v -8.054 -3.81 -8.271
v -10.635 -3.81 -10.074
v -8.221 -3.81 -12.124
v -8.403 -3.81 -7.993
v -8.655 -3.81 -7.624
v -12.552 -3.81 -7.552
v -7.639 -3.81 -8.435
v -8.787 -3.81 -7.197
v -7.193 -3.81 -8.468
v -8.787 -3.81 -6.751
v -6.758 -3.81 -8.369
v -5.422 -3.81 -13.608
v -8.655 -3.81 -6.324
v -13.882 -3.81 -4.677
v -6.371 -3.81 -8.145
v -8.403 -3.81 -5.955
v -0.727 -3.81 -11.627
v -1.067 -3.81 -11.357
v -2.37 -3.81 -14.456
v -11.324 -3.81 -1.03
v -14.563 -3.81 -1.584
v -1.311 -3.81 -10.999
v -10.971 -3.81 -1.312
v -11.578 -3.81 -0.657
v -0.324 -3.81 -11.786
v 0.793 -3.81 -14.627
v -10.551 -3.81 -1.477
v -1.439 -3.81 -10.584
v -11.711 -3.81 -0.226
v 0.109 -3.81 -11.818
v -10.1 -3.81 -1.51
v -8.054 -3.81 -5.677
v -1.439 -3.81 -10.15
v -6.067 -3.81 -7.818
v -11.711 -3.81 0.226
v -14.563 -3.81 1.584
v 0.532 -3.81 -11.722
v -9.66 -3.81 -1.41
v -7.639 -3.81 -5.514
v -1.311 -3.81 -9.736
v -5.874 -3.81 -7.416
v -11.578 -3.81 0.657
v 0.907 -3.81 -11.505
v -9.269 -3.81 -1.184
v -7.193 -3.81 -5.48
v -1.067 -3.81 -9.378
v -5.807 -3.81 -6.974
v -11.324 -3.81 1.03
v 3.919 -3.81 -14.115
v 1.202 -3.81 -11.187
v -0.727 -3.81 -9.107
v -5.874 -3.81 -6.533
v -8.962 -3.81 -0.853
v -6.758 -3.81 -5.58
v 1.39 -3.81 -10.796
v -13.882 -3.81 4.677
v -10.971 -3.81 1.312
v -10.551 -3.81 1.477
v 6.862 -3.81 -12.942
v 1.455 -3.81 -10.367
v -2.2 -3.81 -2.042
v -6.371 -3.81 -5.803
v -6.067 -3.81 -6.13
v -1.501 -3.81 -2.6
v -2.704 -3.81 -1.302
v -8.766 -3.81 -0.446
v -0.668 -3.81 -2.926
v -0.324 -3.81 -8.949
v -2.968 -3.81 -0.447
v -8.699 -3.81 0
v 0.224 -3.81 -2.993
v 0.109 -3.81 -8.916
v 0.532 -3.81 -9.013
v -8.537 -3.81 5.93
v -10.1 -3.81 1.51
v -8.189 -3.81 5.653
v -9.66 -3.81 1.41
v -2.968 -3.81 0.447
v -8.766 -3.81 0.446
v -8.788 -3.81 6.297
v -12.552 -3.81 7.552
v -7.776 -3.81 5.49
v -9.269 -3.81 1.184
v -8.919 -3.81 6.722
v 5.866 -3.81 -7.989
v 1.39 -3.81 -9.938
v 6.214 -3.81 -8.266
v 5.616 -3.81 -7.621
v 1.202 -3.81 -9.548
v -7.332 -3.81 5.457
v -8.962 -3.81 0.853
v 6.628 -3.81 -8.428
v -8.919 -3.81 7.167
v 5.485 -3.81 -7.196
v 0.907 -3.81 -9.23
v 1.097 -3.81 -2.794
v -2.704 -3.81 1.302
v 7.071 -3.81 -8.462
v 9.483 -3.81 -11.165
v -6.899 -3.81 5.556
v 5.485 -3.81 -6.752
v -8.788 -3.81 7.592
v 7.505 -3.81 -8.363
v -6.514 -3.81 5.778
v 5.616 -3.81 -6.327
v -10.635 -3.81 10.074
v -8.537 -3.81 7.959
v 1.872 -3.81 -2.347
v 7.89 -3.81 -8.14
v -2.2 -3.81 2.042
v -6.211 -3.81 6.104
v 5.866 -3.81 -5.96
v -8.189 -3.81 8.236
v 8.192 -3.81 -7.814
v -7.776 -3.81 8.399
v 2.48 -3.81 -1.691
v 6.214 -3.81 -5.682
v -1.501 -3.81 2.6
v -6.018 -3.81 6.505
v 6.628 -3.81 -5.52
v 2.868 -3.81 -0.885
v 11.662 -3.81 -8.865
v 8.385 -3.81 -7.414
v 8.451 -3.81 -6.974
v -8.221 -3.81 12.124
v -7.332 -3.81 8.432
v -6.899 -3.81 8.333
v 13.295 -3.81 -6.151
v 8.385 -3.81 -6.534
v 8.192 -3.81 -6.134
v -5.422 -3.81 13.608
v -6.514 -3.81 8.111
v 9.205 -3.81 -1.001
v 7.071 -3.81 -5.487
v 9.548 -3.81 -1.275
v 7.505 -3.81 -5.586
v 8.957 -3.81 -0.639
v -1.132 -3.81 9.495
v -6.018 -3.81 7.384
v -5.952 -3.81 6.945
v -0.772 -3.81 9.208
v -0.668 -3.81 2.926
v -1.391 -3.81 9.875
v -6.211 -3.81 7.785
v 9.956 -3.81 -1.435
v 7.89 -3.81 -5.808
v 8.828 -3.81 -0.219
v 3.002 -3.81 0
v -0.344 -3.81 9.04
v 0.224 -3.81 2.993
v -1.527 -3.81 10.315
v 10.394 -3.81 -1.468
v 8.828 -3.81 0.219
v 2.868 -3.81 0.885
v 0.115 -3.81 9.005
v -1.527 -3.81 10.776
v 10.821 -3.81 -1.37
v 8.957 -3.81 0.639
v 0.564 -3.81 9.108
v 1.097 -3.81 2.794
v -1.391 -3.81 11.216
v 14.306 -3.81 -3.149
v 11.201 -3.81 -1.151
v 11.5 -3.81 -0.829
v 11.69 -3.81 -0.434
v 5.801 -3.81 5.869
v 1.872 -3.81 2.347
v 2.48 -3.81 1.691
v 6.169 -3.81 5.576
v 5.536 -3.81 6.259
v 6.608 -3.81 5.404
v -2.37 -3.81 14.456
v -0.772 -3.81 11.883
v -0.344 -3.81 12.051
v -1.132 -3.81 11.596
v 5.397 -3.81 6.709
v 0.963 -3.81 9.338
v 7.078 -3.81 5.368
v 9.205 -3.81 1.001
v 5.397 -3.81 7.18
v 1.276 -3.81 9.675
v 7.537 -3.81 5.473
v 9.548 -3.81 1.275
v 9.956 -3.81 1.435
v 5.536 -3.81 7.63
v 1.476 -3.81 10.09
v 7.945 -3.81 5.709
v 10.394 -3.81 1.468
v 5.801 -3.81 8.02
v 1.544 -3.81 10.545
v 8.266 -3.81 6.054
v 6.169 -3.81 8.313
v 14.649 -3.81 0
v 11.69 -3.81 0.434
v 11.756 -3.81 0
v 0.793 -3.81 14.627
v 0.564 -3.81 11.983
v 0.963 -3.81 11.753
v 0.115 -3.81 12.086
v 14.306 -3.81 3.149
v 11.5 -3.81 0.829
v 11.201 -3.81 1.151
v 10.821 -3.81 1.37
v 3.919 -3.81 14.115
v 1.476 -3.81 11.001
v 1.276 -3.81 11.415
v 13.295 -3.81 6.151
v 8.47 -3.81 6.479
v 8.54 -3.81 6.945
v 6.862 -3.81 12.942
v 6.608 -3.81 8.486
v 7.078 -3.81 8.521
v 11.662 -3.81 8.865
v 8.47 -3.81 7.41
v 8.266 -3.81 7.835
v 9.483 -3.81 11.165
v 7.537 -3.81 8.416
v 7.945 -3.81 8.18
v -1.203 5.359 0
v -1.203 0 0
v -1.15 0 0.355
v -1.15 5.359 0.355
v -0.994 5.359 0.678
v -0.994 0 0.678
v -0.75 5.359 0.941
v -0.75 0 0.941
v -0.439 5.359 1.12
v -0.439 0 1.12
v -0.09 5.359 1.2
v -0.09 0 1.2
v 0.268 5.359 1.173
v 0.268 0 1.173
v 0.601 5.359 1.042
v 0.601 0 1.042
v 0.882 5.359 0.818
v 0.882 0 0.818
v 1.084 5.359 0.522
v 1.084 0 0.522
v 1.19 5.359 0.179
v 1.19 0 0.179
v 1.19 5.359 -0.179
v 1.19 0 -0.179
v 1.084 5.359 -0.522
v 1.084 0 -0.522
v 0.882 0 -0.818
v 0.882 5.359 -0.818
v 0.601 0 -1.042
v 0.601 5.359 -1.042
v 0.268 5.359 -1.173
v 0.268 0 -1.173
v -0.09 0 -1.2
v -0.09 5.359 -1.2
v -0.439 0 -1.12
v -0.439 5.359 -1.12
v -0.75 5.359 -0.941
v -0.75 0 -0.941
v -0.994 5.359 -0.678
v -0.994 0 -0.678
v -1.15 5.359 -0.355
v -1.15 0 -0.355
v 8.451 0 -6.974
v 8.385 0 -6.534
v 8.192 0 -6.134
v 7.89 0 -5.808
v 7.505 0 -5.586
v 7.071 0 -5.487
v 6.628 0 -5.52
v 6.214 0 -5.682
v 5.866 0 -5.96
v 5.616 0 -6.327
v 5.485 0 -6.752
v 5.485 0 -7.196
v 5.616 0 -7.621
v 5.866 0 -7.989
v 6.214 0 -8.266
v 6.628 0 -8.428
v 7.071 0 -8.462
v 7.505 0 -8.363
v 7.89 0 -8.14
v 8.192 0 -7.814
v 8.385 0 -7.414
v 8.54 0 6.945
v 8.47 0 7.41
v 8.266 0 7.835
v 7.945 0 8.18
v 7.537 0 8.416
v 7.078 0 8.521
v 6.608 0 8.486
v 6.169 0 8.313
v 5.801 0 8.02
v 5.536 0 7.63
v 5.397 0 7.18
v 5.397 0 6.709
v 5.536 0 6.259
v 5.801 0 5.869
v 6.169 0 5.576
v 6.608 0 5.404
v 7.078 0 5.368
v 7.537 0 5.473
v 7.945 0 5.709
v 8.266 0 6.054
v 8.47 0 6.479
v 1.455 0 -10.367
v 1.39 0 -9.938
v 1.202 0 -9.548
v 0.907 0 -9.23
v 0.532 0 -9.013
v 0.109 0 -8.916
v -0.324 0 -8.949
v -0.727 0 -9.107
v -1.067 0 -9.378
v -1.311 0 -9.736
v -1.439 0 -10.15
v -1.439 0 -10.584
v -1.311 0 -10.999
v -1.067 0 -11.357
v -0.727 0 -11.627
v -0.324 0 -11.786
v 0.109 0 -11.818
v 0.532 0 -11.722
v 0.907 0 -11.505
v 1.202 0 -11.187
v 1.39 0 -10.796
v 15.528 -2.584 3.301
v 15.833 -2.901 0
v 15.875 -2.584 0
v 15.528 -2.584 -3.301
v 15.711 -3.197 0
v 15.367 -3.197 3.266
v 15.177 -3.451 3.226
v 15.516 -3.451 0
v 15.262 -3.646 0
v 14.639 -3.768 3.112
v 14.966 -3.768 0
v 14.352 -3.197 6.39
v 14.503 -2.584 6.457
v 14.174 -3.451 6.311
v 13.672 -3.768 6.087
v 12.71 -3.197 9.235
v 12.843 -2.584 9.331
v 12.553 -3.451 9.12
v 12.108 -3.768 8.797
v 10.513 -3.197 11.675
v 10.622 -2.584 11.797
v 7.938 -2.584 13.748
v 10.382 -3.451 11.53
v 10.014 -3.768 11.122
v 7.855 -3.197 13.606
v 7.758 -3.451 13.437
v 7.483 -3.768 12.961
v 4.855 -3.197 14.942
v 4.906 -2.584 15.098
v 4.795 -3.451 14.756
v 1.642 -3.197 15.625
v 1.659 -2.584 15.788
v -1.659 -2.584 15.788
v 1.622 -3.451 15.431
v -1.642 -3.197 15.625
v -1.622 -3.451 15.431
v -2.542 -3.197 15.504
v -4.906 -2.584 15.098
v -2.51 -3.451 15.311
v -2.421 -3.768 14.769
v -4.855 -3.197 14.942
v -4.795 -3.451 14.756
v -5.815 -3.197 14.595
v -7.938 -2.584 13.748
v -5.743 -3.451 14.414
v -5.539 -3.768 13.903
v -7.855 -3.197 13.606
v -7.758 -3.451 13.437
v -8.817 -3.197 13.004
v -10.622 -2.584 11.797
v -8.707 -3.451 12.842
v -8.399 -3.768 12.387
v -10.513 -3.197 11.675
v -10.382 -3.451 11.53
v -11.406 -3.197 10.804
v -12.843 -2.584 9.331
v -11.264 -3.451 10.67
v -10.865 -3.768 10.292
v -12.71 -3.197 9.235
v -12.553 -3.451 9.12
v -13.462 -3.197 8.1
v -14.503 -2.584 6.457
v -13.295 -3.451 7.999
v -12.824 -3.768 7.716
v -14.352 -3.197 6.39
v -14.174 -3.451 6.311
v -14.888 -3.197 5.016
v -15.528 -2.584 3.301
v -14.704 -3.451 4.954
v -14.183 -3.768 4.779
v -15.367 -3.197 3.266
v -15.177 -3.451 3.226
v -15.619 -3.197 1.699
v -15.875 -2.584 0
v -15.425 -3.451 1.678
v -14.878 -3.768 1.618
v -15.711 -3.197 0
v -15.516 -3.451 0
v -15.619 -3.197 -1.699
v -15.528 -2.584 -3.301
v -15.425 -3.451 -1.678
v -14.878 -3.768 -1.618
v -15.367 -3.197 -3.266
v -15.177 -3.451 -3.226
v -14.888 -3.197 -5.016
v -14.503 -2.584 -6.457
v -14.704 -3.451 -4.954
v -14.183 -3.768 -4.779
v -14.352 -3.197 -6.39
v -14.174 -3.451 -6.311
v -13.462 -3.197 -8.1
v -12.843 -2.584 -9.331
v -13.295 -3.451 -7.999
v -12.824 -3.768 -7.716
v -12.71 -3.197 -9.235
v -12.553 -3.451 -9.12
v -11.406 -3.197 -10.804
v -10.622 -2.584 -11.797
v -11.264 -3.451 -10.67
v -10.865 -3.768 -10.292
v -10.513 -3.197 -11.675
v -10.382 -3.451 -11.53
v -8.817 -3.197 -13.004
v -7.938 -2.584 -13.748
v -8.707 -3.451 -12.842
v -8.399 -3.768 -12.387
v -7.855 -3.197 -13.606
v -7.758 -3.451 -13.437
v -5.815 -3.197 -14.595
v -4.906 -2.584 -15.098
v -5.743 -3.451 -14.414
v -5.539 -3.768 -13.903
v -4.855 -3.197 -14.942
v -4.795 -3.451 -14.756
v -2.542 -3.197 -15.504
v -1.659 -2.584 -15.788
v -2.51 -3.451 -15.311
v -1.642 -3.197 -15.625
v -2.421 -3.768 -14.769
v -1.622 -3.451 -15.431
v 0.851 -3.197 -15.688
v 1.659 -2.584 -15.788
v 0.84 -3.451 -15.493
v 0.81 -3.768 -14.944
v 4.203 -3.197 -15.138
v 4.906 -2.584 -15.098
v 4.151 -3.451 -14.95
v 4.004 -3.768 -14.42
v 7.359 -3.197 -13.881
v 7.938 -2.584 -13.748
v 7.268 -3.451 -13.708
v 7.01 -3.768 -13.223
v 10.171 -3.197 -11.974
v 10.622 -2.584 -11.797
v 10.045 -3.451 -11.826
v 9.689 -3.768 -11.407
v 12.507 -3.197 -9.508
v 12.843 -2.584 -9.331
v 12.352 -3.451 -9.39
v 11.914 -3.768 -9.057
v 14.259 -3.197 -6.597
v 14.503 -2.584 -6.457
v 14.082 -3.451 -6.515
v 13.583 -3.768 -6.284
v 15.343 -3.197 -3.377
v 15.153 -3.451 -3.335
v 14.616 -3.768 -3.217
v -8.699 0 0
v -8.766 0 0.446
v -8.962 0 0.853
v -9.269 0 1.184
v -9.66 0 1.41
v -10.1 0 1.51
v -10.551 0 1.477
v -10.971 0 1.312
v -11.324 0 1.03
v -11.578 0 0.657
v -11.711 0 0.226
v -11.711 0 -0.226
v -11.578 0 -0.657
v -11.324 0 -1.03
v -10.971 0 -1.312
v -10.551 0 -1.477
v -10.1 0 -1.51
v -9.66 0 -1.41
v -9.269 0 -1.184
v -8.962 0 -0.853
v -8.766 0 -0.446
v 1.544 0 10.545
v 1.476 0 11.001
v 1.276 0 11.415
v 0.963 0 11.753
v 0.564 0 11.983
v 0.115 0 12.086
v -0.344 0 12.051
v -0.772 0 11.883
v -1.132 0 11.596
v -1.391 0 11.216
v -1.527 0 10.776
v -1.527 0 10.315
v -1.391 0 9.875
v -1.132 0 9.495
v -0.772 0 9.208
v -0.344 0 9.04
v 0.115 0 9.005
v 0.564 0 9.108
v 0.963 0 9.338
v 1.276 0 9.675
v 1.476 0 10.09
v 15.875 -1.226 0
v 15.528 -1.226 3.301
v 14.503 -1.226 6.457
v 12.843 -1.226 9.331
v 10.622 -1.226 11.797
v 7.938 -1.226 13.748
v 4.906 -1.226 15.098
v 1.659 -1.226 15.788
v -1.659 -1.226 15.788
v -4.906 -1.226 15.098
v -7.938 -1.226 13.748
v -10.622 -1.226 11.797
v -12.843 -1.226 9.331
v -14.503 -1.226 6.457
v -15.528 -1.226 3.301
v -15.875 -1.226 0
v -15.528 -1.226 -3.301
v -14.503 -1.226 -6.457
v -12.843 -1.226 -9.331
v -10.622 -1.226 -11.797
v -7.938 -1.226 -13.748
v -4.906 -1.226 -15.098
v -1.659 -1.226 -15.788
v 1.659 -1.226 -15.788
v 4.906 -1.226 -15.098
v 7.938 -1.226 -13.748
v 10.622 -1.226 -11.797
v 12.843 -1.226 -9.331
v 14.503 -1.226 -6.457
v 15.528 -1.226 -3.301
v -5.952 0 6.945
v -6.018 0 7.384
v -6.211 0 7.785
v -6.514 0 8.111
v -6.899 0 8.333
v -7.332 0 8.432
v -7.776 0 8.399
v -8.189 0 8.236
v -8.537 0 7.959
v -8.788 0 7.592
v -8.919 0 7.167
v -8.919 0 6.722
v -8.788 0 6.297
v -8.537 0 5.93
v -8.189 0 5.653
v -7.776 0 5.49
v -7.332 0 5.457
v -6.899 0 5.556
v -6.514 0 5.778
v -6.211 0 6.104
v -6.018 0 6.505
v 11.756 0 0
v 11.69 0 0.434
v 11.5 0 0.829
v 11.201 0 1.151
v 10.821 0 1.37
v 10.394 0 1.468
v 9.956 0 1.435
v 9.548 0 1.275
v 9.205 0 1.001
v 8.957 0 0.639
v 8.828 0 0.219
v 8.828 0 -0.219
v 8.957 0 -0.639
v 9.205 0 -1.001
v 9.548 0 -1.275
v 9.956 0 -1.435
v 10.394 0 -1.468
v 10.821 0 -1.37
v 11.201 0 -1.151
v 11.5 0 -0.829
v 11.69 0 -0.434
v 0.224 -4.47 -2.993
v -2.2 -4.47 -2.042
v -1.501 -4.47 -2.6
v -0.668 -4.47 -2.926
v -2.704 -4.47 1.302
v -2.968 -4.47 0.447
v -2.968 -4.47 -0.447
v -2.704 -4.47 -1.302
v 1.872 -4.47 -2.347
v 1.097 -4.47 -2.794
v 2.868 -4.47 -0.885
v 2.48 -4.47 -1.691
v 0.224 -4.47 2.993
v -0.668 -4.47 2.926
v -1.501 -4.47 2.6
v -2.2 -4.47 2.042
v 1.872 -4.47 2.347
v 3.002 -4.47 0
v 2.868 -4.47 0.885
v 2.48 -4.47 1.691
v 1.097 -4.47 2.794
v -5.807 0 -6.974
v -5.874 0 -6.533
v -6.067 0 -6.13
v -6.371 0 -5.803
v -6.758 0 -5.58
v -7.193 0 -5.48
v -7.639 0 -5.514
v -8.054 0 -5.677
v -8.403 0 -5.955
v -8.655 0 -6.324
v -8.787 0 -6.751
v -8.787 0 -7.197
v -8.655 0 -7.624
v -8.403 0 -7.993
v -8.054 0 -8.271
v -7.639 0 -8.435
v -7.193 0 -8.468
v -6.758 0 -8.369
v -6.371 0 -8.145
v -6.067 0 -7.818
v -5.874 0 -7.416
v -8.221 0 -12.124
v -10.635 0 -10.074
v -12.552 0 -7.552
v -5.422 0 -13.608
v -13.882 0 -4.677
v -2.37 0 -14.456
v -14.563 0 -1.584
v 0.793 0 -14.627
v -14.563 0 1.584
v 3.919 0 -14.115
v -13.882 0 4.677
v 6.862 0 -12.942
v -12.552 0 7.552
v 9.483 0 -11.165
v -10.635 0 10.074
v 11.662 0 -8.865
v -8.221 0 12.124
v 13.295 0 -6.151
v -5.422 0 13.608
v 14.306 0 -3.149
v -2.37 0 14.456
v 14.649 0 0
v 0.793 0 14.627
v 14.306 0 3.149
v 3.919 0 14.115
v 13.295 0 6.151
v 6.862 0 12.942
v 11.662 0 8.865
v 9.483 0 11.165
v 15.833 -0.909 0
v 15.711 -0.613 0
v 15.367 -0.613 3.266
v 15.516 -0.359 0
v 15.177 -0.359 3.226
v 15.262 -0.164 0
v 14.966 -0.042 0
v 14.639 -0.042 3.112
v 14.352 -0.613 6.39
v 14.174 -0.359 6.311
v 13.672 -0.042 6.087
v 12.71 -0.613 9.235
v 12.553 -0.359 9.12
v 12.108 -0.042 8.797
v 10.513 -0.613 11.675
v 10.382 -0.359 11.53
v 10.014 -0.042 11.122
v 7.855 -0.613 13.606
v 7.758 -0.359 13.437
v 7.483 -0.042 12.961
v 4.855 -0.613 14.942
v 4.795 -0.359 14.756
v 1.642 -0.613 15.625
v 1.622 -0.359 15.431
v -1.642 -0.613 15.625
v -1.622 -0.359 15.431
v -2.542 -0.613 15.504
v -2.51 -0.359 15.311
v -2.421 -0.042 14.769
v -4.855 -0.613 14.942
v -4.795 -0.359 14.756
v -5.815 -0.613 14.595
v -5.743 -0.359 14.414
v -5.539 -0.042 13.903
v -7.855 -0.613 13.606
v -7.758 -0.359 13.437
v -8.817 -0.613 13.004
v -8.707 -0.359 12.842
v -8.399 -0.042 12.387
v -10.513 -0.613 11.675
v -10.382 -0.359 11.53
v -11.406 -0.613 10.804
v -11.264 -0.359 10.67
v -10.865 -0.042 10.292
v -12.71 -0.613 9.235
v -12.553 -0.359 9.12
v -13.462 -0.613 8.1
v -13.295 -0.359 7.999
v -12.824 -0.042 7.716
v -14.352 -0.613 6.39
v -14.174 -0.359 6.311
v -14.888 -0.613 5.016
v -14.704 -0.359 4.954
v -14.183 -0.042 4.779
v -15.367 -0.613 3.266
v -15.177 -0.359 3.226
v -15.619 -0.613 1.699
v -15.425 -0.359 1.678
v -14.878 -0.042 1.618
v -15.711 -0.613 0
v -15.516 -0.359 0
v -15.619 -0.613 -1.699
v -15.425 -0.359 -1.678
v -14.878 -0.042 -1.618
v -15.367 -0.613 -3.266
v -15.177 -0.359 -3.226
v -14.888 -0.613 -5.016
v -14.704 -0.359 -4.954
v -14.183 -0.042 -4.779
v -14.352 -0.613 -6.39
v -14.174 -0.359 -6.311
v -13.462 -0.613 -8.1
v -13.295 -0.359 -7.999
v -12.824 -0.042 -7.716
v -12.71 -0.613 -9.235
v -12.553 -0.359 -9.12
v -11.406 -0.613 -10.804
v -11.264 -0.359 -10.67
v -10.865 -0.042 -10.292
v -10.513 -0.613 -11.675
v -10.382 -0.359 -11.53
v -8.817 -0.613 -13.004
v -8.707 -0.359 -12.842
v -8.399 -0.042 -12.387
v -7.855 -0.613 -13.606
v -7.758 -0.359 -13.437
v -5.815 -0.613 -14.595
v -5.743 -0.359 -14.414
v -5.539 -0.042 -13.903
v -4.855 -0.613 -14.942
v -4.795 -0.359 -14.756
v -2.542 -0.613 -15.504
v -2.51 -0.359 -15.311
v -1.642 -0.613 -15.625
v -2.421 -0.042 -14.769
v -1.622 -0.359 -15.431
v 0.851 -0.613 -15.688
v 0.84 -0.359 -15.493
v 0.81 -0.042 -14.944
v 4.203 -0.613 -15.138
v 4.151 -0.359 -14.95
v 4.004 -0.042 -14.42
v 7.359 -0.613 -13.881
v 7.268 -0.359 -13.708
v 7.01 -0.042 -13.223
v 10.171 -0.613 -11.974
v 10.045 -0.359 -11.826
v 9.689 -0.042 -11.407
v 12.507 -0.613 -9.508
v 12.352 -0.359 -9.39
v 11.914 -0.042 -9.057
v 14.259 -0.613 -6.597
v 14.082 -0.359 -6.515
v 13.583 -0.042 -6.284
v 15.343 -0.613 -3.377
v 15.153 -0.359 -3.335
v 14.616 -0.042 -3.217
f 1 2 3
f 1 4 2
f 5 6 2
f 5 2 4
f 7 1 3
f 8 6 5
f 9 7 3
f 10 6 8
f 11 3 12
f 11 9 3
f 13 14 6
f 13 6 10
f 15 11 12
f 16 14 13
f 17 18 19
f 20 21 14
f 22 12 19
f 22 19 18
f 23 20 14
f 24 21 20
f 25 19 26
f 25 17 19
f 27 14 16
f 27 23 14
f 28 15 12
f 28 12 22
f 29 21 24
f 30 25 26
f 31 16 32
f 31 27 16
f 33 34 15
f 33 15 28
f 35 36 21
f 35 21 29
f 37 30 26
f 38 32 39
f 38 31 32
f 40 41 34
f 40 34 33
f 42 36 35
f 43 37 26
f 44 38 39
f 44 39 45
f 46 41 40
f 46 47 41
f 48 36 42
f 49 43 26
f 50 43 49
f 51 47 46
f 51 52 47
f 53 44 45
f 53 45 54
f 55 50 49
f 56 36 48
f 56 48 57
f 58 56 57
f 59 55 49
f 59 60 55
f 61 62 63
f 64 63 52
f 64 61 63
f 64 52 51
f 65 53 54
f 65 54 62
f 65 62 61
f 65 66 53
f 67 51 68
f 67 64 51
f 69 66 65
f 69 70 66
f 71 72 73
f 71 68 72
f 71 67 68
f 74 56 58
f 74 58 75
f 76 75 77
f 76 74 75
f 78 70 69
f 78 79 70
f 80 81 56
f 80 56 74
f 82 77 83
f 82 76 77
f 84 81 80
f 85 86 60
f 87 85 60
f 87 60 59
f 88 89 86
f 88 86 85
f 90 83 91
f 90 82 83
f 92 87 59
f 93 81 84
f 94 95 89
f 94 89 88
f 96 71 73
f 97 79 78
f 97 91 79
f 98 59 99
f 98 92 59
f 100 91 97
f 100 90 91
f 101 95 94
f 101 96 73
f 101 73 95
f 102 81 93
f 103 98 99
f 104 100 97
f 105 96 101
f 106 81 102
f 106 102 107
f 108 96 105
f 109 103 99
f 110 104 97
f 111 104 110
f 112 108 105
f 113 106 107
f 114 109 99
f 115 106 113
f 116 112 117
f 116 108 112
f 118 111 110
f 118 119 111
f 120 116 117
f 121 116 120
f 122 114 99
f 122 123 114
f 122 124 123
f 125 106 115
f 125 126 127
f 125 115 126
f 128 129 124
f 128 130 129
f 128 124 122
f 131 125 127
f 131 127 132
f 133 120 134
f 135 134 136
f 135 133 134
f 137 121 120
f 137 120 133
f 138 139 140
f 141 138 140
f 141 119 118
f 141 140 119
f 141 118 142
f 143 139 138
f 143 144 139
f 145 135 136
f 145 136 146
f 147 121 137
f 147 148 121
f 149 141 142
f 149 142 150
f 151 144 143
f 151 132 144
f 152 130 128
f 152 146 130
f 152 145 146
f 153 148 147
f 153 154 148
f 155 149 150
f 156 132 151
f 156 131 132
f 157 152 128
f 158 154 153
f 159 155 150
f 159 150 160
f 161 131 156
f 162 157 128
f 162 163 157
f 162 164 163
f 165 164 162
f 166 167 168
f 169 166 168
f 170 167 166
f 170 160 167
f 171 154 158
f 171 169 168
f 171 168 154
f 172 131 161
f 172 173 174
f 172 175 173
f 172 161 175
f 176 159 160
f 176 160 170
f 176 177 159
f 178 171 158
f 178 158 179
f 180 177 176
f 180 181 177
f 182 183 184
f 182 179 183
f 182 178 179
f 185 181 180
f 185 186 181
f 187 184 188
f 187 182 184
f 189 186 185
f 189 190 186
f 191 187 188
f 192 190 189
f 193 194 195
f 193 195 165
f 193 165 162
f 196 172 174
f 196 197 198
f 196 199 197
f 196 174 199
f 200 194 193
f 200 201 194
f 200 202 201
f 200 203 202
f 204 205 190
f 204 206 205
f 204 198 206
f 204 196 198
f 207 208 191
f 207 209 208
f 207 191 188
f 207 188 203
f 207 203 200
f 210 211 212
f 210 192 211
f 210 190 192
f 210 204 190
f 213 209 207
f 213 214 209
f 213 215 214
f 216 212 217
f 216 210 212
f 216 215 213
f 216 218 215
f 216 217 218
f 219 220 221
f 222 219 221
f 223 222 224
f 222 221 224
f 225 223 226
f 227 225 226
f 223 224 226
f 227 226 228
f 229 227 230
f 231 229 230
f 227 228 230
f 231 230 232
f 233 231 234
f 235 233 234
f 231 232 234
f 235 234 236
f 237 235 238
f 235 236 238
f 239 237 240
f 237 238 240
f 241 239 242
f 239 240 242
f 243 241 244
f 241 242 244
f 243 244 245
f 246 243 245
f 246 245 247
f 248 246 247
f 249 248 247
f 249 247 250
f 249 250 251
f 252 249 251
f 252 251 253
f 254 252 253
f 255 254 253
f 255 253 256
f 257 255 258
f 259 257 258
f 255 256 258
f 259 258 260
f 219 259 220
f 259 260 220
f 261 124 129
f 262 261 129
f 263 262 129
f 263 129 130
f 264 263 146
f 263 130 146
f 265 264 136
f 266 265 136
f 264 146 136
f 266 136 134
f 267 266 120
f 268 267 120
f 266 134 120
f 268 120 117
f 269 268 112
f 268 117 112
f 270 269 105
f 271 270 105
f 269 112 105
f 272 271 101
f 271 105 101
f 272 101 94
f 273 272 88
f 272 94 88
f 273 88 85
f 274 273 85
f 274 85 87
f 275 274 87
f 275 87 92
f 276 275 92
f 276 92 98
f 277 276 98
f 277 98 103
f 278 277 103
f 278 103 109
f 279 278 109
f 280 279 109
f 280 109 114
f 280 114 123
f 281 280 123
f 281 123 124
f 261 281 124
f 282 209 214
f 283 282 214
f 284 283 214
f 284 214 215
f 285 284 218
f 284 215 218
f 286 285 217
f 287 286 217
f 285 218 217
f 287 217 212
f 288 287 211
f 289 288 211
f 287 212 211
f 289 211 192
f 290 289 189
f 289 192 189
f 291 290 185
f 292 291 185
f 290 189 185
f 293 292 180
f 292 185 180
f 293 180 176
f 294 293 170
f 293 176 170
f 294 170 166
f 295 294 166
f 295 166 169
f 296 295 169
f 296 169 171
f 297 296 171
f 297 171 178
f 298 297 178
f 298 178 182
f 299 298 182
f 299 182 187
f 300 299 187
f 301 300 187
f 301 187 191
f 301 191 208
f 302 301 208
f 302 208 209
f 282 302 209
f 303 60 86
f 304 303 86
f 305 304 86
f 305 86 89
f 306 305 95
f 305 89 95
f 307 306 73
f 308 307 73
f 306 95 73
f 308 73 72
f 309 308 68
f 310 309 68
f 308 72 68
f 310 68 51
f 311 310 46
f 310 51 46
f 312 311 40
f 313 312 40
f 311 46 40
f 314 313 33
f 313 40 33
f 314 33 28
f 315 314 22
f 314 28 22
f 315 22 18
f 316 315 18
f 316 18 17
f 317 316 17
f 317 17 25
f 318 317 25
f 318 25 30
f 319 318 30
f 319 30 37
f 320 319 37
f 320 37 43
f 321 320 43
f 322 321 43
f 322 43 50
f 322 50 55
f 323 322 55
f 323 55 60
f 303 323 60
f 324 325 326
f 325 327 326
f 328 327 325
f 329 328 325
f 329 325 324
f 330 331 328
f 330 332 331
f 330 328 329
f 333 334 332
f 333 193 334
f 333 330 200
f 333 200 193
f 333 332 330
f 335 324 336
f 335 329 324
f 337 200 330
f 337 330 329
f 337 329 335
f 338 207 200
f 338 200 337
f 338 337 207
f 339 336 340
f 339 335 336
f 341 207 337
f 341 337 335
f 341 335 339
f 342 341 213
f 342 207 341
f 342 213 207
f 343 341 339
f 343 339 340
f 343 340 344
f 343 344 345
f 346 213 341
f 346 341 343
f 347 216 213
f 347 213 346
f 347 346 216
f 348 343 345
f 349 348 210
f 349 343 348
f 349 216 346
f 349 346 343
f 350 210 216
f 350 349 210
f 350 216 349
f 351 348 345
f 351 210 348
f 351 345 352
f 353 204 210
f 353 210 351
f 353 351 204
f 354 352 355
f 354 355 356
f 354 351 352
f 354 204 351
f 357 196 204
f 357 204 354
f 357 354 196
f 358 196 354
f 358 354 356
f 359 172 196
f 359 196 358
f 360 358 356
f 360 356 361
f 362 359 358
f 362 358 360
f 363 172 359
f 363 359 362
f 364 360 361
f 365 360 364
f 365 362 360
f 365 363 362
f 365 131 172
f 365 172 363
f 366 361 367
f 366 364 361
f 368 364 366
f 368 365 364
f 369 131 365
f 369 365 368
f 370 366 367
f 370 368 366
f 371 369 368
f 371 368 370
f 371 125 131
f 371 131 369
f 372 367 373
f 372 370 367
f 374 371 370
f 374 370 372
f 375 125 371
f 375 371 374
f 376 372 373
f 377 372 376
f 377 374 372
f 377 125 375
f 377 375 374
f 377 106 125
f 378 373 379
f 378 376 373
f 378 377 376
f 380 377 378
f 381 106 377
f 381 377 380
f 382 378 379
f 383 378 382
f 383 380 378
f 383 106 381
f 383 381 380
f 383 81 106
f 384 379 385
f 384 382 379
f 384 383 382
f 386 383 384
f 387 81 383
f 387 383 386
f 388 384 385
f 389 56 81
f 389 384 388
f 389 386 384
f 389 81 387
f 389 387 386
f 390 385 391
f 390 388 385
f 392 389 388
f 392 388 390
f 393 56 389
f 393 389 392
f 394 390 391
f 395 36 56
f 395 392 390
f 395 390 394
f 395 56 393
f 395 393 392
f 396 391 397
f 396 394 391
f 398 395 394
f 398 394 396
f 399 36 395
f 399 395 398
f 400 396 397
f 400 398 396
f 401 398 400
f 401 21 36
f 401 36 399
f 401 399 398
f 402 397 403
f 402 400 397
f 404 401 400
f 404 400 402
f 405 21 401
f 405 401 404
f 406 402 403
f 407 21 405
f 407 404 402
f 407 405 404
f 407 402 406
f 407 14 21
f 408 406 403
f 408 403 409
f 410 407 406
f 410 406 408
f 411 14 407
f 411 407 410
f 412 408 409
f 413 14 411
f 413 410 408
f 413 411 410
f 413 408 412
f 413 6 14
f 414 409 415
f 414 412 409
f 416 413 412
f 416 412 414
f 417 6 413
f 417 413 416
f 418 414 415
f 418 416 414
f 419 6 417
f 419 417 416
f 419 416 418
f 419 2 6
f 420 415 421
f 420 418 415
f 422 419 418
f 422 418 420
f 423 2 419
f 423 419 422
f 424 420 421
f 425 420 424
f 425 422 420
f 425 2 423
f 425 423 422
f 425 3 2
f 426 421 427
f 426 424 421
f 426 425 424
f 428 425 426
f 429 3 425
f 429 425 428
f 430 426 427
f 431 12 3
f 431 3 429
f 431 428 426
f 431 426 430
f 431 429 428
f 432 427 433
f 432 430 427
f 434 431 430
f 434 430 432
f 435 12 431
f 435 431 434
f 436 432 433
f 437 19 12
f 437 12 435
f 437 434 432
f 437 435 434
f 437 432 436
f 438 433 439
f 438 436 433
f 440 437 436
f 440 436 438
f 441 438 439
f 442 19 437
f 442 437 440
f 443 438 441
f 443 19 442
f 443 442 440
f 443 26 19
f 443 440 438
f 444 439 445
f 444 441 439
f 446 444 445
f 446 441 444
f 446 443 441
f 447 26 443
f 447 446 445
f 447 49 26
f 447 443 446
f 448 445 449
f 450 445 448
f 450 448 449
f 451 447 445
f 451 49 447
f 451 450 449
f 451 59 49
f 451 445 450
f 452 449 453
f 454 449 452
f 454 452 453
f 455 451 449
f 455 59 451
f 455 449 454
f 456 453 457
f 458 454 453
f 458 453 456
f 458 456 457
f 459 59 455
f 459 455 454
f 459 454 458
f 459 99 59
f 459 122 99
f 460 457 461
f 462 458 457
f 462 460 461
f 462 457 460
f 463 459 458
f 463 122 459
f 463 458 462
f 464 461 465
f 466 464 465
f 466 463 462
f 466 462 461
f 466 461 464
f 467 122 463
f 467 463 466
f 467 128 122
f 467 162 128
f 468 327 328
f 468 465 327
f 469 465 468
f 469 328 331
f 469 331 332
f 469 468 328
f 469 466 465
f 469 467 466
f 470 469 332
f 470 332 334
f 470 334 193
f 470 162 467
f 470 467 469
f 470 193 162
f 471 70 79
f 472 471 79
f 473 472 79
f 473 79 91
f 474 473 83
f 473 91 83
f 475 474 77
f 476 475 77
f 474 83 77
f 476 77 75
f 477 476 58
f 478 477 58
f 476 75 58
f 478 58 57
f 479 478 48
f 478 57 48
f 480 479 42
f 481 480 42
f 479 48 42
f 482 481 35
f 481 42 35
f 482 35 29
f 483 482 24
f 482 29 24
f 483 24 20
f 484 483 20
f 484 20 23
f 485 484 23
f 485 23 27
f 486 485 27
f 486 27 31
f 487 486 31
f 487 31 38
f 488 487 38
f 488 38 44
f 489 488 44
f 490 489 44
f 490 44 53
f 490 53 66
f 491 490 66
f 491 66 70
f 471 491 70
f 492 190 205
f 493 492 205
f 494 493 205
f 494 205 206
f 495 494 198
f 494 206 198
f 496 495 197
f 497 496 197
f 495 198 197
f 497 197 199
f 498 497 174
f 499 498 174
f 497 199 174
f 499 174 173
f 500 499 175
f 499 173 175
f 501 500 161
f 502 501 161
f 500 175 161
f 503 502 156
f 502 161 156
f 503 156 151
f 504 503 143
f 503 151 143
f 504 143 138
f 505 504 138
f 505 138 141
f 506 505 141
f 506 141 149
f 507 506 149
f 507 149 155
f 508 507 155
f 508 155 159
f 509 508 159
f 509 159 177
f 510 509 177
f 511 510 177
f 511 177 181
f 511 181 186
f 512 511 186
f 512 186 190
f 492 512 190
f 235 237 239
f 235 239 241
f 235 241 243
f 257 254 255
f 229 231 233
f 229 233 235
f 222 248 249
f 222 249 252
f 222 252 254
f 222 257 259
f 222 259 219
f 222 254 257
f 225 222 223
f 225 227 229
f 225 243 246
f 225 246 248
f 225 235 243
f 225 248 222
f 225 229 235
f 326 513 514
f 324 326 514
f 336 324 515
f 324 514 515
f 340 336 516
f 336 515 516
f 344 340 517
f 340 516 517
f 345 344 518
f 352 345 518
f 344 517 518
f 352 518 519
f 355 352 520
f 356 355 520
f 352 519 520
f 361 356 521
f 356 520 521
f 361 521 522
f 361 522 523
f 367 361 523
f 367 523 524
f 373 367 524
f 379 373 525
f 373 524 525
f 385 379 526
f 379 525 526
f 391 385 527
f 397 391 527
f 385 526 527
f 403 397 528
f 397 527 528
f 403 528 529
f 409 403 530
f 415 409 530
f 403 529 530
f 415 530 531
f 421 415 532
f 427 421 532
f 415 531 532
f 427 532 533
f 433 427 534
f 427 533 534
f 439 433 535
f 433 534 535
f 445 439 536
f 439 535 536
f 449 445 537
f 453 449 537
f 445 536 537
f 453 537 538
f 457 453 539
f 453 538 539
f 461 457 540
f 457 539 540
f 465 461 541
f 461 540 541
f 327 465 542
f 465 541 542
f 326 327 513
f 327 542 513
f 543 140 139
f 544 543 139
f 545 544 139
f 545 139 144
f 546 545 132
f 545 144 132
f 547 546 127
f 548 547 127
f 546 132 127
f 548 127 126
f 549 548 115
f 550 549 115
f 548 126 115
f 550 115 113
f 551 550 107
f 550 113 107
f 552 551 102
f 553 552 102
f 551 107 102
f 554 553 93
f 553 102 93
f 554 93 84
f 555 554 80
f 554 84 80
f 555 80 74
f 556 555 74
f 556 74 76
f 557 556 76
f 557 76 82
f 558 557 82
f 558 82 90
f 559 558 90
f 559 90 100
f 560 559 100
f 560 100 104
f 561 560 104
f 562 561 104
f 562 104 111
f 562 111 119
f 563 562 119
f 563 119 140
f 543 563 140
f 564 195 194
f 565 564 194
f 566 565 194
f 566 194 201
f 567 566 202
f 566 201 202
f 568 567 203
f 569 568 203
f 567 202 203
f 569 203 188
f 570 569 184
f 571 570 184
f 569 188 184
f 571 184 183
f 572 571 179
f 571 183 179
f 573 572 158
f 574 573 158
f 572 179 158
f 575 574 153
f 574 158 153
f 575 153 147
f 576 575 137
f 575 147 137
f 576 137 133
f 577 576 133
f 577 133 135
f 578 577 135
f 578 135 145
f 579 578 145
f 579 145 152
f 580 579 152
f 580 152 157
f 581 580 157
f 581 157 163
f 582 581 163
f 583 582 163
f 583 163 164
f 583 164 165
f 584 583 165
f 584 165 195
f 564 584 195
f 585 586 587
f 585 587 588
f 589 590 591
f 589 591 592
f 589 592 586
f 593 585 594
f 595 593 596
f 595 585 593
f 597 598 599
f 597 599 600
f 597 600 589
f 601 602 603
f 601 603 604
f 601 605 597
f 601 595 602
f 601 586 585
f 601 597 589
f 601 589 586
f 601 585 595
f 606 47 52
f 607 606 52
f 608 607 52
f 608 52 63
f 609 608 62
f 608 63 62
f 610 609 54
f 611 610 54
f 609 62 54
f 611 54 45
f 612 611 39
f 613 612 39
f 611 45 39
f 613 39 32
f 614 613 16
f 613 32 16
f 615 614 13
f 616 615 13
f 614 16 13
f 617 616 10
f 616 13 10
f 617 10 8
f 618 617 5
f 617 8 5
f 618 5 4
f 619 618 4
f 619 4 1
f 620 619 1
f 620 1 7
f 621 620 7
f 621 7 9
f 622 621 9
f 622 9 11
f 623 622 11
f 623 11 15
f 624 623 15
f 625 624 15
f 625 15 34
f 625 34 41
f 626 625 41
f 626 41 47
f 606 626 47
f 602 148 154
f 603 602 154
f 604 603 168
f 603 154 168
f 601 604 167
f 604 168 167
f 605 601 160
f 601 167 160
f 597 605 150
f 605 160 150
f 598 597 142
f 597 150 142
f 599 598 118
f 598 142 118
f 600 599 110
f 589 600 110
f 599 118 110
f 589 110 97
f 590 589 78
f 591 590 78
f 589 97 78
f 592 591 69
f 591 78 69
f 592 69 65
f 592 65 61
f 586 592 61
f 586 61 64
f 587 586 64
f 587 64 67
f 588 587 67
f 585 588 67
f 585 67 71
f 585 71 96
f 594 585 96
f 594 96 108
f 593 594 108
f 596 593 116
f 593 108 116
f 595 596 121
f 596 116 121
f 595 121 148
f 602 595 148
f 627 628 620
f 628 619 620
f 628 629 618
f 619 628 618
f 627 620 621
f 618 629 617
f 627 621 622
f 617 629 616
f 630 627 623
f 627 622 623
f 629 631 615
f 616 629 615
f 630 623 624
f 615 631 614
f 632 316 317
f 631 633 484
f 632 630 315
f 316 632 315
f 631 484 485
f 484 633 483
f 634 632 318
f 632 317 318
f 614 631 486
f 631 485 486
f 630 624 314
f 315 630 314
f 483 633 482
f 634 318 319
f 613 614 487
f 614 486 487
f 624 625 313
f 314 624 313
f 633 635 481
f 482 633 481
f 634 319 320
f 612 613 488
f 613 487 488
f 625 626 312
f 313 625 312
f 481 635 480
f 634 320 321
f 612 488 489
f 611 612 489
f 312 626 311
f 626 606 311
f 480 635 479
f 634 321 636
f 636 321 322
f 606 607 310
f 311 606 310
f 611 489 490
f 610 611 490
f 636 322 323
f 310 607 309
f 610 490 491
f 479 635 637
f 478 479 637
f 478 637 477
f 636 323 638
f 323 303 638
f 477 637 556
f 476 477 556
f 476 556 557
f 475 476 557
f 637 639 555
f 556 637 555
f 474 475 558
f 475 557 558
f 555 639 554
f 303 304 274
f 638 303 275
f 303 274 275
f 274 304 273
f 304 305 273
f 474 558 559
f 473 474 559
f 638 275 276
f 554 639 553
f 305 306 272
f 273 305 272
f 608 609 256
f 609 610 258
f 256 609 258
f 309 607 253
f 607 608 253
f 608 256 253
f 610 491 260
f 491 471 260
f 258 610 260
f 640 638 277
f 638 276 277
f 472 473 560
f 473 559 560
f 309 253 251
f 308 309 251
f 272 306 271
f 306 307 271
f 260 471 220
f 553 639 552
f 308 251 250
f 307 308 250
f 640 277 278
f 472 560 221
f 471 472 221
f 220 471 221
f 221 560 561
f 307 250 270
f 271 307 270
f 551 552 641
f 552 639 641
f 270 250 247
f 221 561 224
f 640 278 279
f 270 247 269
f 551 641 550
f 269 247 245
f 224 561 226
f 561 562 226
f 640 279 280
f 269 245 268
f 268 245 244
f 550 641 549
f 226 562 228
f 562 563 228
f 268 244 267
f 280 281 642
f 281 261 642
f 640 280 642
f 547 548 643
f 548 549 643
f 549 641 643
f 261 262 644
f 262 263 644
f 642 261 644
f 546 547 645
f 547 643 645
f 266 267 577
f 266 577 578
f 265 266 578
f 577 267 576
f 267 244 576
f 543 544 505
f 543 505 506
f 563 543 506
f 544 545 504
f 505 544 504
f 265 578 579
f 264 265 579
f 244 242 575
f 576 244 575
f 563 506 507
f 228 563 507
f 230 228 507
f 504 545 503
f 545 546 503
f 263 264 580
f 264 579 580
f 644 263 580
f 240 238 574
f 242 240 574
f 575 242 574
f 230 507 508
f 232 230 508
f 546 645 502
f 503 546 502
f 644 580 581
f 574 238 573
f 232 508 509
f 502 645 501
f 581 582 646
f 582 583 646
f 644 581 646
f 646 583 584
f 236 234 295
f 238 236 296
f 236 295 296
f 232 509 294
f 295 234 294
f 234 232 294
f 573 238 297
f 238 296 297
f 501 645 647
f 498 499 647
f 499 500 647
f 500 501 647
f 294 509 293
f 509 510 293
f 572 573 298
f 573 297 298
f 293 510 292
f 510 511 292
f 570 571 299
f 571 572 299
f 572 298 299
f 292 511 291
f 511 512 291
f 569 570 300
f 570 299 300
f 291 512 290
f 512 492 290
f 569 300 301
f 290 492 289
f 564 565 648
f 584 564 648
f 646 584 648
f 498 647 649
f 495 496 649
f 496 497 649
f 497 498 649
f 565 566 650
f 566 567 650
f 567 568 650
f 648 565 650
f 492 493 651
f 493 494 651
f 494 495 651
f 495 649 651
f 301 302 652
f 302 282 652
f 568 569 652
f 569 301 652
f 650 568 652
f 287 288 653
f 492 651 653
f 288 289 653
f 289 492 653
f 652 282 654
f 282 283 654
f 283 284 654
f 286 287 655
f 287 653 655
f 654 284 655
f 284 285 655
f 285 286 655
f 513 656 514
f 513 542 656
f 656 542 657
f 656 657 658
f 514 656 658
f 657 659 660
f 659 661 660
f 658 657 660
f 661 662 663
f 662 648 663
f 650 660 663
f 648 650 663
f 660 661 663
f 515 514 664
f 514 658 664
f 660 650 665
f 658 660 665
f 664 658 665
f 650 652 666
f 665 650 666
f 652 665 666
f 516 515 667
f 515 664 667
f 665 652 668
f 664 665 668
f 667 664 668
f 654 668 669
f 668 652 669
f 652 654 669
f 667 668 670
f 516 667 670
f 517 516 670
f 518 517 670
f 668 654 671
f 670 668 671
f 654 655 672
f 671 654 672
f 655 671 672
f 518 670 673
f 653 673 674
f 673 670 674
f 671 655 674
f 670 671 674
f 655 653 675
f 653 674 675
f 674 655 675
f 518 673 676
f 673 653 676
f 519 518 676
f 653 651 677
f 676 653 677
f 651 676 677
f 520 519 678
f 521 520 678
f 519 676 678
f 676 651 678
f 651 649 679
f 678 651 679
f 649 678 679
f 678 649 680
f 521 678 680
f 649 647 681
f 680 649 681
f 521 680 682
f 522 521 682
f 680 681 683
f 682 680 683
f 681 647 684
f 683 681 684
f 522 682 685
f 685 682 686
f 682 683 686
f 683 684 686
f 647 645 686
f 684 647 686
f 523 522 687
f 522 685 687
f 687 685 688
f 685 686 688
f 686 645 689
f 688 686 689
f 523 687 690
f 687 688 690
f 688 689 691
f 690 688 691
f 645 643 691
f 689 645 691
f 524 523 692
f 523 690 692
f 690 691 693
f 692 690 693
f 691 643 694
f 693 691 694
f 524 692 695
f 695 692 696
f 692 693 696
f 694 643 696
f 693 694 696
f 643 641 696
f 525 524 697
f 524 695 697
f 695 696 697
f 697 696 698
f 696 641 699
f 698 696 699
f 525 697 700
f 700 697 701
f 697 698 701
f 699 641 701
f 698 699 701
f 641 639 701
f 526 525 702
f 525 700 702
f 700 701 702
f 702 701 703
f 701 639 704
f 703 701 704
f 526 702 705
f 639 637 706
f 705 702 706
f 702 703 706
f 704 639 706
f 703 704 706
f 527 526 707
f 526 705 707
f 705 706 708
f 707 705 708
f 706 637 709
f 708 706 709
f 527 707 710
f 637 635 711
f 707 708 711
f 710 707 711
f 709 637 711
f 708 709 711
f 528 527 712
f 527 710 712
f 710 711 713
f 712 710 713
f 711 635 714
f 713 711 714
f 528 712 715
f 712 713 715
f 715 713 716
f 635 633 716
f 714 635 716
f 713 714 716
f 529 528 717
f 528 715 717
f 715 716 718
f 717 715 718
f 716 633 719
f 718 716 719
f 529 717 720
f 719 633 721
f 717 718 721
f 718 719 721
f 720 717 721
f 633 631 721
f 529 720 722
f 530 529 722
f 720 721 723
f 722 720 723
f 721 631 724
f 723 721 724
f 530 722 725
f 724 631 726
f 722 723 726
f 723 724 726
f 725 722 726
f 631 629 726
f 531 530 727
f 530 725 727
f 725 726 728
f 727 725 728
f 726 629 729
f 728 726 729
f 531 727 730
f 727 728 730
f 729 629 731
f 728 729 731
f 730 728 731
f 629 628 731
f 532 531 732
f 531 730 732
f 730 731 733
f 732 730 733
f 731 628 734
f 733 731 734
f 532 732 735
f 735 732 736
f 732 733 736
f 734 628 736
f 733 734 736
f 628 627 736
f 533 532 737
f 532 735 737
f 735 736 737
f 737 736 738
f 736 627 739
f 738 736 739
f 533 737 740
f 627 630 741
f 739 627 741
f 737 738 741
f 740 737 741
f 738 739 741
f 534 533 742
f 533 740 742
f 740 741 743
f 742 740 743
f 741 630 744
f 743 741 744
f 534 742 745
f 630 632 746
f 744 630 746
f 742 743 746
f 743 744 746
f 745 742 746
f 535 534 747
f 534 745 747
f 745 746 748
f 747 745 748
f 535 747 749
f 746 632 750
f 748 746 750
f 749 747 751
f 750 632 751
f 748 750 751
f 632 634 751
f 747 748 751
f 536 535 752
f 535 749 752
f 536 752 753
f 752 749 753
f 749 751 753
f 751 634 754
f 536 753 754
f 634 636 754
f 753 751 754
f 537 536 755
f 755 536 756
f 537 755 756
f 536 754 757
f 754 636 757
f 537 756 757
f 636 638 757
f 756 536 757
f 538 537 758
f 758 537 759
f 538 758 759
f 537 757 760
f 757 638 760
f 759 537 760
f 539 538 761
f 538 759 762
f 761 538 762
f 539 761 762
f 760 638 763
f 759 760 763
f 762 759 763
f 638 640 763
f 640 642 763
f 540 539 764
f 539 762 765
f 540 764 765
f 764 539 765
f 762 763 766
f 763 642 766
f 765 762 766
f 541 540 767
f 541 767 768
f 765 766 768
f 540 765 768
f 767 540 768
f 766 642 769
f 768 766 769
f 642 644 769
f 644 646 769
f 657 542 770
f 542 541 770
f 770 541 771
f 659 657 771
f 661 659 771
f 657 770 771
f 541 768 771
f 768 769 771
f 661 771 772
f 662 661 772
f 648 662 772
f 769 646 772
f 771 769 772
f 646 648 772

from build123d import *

# Parameters (mm, degrees)
F0_R     = 15.875
F1_DEPTH = 3.81
F3_R     = 1.454915
F3_R_2   = 1.498047
F3_R_3   = 1.514597
F3_R_4   = 1.491631
F3_R_5   = 1.471893
F3_R_6   = 1.580597
F3_R_7   = 1.544444
F4_DEPTH = 25.4
F6_R     = 1.22642
F7_R     = 1.202977
F8_DEPTH = 5.3594
F5_R     = 3.001673
F9_DEPTH = 0.6604


with BuildPart() as f1:
    # F0 (on Front) → F1 (new body)
    with BuildSketch(Plane.XZ):
        Circle(F0_R)
    extrude(amount=F1_DEPTH)

    # F3 (on face) → F4 (cut)
    with BuildSketch(Plane.XZ.offset(3.81)):
        with Locations((0, -10.367244)):
            Circle(F3_R)
        with Locations((-7.305188, -6.974129)):
            Circle(F3_R_2)
        with Locations((-10.213573, 0)):
            Circle(F3_R_3)
        with Locations((-7.443683, 6.944567)):
            Circle(F3_R_4)
        with Locations((10.28361, 0)):
            Circle(F3_R_5)
        with Locations((6.959744, -6.974129)):
            Circle(F3_R_4)
        with Locations((6.959744, 6.944567)):
            Circle(F3_R_6)
        with Locations((0, 10.545424)):
            Circle(F3_R_7)
    extrude(amount=-F4_DEPTH, mode=Mode.SUBTRACT)

    # F6
    f6_edges = [f1.edges().sort_by_distance(p)[0] for p in [
        (15.875, -1.905, 0),
        (-15.875, 0, 0),
        (-15.875, -3.81, 0),
    ]]
    fillet(f6_edges, radius=F6_R)

    # F7 (on face) → F8 (join)
    with BuildSketch(Plane(origin=(0, 0, 0), x_dir=(-1, 0, 0), z_dir=(0, 1, 0))):
        Circle(F7_R)
    extrude(amount=F8_DEPTH)

    # F5 (on face) → F9 (join)
    with BuildSketch(Plane.XZ.offset(3.81)):
        Circle(F5_R)
    extrude(amount=F9_DEPTH)


solid = f1.part
